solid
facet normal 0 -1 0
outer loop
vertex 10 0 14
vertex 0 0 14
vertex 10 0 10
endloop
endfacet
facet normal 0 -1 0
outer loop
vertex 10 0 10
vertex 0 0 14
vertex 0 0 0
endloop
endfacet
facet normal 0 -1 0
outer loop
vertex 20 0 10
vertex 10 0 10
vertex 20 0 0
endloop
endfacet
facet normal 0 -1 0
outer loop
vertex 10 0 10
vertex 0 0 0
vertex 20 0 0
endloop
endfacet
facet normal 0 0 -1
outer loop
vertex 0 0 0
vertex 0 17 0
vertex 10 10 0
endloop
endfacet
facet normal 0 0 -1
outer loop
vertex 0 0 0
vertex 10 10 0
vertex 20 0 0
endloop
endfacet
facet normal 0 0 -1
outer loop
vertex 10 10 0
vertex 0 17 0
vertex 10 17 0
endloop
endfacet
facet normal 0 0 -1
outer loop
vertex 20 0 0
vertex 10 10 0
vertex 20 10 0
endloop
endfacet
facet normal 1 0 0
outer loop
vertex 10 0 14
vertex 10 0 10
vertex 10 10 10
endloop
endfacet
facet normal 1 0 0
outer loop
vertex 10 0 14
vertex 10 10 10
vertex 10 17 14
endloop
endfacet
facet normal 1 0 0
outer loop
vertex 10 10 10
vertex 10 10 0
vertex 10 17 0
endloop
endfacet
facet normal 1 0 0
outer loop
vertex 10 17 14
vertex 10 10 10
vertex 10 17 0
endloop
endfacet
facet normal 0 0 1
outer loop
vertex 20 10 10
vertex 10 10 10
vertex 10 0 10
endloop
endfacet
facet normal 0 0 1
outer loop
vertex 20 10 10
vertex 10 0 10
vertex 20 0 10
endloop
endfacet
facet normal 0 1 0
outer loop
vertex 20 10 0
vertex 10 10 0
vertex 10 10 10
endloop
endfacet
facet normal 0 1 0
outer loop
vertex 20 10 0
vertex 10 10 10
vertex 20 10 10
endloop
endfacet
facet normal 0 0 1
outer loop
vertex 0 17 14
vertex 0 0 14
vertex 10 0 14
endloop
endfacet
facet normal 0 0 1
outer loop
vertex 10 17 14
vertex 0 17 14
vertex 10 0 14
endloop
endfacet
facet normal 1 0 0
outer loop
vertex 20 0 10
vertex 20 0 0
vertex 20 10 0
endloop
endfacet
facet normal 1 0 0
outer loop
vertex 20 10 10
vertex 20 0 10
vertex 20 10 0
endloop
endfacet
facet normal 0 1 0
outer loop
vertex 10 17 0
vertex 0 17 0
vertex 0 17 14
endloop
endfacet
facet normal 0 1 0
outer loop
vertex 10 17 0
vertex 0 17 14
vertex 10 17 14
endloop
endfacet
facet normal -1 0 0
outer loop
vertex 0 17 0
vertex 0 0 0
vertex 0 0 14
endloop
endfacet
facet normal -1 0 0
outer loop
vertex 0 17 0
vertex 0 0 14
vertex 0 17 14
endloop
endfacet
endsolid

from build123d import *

# Parameters (mm, degrees)
BOX_W        = 10
BOX_H        = 17
BOX_DEPTH    = 14
BOX001_W     = 10
BOX001_H     = 10
BOX001_DEPTH = 10


with BuildPart() as box:
    # Box → Box (new body)
    with BuildSketch(Plane.XY):
        with Locations((5, 8.5)):
            Rectangle(BOX_W, BOX_H)
    extrude(amount=BOX_DEPTH)


with BuildPart() as fusion:
    # Box001 → Box001 (new body)
    with BuildSketch(Plane(origin=(10, 0, 0), x_dir=(1, 0, 0), z_dir=(0, 0, 1))):
        with Locations((5, 5)):
            Rectangle(BOX001_W, BOX001_H)
    extrude(amount=BOX001_DEPTH)

    # Fusion: union Box
    add(box.part)


solid = fusion.part
